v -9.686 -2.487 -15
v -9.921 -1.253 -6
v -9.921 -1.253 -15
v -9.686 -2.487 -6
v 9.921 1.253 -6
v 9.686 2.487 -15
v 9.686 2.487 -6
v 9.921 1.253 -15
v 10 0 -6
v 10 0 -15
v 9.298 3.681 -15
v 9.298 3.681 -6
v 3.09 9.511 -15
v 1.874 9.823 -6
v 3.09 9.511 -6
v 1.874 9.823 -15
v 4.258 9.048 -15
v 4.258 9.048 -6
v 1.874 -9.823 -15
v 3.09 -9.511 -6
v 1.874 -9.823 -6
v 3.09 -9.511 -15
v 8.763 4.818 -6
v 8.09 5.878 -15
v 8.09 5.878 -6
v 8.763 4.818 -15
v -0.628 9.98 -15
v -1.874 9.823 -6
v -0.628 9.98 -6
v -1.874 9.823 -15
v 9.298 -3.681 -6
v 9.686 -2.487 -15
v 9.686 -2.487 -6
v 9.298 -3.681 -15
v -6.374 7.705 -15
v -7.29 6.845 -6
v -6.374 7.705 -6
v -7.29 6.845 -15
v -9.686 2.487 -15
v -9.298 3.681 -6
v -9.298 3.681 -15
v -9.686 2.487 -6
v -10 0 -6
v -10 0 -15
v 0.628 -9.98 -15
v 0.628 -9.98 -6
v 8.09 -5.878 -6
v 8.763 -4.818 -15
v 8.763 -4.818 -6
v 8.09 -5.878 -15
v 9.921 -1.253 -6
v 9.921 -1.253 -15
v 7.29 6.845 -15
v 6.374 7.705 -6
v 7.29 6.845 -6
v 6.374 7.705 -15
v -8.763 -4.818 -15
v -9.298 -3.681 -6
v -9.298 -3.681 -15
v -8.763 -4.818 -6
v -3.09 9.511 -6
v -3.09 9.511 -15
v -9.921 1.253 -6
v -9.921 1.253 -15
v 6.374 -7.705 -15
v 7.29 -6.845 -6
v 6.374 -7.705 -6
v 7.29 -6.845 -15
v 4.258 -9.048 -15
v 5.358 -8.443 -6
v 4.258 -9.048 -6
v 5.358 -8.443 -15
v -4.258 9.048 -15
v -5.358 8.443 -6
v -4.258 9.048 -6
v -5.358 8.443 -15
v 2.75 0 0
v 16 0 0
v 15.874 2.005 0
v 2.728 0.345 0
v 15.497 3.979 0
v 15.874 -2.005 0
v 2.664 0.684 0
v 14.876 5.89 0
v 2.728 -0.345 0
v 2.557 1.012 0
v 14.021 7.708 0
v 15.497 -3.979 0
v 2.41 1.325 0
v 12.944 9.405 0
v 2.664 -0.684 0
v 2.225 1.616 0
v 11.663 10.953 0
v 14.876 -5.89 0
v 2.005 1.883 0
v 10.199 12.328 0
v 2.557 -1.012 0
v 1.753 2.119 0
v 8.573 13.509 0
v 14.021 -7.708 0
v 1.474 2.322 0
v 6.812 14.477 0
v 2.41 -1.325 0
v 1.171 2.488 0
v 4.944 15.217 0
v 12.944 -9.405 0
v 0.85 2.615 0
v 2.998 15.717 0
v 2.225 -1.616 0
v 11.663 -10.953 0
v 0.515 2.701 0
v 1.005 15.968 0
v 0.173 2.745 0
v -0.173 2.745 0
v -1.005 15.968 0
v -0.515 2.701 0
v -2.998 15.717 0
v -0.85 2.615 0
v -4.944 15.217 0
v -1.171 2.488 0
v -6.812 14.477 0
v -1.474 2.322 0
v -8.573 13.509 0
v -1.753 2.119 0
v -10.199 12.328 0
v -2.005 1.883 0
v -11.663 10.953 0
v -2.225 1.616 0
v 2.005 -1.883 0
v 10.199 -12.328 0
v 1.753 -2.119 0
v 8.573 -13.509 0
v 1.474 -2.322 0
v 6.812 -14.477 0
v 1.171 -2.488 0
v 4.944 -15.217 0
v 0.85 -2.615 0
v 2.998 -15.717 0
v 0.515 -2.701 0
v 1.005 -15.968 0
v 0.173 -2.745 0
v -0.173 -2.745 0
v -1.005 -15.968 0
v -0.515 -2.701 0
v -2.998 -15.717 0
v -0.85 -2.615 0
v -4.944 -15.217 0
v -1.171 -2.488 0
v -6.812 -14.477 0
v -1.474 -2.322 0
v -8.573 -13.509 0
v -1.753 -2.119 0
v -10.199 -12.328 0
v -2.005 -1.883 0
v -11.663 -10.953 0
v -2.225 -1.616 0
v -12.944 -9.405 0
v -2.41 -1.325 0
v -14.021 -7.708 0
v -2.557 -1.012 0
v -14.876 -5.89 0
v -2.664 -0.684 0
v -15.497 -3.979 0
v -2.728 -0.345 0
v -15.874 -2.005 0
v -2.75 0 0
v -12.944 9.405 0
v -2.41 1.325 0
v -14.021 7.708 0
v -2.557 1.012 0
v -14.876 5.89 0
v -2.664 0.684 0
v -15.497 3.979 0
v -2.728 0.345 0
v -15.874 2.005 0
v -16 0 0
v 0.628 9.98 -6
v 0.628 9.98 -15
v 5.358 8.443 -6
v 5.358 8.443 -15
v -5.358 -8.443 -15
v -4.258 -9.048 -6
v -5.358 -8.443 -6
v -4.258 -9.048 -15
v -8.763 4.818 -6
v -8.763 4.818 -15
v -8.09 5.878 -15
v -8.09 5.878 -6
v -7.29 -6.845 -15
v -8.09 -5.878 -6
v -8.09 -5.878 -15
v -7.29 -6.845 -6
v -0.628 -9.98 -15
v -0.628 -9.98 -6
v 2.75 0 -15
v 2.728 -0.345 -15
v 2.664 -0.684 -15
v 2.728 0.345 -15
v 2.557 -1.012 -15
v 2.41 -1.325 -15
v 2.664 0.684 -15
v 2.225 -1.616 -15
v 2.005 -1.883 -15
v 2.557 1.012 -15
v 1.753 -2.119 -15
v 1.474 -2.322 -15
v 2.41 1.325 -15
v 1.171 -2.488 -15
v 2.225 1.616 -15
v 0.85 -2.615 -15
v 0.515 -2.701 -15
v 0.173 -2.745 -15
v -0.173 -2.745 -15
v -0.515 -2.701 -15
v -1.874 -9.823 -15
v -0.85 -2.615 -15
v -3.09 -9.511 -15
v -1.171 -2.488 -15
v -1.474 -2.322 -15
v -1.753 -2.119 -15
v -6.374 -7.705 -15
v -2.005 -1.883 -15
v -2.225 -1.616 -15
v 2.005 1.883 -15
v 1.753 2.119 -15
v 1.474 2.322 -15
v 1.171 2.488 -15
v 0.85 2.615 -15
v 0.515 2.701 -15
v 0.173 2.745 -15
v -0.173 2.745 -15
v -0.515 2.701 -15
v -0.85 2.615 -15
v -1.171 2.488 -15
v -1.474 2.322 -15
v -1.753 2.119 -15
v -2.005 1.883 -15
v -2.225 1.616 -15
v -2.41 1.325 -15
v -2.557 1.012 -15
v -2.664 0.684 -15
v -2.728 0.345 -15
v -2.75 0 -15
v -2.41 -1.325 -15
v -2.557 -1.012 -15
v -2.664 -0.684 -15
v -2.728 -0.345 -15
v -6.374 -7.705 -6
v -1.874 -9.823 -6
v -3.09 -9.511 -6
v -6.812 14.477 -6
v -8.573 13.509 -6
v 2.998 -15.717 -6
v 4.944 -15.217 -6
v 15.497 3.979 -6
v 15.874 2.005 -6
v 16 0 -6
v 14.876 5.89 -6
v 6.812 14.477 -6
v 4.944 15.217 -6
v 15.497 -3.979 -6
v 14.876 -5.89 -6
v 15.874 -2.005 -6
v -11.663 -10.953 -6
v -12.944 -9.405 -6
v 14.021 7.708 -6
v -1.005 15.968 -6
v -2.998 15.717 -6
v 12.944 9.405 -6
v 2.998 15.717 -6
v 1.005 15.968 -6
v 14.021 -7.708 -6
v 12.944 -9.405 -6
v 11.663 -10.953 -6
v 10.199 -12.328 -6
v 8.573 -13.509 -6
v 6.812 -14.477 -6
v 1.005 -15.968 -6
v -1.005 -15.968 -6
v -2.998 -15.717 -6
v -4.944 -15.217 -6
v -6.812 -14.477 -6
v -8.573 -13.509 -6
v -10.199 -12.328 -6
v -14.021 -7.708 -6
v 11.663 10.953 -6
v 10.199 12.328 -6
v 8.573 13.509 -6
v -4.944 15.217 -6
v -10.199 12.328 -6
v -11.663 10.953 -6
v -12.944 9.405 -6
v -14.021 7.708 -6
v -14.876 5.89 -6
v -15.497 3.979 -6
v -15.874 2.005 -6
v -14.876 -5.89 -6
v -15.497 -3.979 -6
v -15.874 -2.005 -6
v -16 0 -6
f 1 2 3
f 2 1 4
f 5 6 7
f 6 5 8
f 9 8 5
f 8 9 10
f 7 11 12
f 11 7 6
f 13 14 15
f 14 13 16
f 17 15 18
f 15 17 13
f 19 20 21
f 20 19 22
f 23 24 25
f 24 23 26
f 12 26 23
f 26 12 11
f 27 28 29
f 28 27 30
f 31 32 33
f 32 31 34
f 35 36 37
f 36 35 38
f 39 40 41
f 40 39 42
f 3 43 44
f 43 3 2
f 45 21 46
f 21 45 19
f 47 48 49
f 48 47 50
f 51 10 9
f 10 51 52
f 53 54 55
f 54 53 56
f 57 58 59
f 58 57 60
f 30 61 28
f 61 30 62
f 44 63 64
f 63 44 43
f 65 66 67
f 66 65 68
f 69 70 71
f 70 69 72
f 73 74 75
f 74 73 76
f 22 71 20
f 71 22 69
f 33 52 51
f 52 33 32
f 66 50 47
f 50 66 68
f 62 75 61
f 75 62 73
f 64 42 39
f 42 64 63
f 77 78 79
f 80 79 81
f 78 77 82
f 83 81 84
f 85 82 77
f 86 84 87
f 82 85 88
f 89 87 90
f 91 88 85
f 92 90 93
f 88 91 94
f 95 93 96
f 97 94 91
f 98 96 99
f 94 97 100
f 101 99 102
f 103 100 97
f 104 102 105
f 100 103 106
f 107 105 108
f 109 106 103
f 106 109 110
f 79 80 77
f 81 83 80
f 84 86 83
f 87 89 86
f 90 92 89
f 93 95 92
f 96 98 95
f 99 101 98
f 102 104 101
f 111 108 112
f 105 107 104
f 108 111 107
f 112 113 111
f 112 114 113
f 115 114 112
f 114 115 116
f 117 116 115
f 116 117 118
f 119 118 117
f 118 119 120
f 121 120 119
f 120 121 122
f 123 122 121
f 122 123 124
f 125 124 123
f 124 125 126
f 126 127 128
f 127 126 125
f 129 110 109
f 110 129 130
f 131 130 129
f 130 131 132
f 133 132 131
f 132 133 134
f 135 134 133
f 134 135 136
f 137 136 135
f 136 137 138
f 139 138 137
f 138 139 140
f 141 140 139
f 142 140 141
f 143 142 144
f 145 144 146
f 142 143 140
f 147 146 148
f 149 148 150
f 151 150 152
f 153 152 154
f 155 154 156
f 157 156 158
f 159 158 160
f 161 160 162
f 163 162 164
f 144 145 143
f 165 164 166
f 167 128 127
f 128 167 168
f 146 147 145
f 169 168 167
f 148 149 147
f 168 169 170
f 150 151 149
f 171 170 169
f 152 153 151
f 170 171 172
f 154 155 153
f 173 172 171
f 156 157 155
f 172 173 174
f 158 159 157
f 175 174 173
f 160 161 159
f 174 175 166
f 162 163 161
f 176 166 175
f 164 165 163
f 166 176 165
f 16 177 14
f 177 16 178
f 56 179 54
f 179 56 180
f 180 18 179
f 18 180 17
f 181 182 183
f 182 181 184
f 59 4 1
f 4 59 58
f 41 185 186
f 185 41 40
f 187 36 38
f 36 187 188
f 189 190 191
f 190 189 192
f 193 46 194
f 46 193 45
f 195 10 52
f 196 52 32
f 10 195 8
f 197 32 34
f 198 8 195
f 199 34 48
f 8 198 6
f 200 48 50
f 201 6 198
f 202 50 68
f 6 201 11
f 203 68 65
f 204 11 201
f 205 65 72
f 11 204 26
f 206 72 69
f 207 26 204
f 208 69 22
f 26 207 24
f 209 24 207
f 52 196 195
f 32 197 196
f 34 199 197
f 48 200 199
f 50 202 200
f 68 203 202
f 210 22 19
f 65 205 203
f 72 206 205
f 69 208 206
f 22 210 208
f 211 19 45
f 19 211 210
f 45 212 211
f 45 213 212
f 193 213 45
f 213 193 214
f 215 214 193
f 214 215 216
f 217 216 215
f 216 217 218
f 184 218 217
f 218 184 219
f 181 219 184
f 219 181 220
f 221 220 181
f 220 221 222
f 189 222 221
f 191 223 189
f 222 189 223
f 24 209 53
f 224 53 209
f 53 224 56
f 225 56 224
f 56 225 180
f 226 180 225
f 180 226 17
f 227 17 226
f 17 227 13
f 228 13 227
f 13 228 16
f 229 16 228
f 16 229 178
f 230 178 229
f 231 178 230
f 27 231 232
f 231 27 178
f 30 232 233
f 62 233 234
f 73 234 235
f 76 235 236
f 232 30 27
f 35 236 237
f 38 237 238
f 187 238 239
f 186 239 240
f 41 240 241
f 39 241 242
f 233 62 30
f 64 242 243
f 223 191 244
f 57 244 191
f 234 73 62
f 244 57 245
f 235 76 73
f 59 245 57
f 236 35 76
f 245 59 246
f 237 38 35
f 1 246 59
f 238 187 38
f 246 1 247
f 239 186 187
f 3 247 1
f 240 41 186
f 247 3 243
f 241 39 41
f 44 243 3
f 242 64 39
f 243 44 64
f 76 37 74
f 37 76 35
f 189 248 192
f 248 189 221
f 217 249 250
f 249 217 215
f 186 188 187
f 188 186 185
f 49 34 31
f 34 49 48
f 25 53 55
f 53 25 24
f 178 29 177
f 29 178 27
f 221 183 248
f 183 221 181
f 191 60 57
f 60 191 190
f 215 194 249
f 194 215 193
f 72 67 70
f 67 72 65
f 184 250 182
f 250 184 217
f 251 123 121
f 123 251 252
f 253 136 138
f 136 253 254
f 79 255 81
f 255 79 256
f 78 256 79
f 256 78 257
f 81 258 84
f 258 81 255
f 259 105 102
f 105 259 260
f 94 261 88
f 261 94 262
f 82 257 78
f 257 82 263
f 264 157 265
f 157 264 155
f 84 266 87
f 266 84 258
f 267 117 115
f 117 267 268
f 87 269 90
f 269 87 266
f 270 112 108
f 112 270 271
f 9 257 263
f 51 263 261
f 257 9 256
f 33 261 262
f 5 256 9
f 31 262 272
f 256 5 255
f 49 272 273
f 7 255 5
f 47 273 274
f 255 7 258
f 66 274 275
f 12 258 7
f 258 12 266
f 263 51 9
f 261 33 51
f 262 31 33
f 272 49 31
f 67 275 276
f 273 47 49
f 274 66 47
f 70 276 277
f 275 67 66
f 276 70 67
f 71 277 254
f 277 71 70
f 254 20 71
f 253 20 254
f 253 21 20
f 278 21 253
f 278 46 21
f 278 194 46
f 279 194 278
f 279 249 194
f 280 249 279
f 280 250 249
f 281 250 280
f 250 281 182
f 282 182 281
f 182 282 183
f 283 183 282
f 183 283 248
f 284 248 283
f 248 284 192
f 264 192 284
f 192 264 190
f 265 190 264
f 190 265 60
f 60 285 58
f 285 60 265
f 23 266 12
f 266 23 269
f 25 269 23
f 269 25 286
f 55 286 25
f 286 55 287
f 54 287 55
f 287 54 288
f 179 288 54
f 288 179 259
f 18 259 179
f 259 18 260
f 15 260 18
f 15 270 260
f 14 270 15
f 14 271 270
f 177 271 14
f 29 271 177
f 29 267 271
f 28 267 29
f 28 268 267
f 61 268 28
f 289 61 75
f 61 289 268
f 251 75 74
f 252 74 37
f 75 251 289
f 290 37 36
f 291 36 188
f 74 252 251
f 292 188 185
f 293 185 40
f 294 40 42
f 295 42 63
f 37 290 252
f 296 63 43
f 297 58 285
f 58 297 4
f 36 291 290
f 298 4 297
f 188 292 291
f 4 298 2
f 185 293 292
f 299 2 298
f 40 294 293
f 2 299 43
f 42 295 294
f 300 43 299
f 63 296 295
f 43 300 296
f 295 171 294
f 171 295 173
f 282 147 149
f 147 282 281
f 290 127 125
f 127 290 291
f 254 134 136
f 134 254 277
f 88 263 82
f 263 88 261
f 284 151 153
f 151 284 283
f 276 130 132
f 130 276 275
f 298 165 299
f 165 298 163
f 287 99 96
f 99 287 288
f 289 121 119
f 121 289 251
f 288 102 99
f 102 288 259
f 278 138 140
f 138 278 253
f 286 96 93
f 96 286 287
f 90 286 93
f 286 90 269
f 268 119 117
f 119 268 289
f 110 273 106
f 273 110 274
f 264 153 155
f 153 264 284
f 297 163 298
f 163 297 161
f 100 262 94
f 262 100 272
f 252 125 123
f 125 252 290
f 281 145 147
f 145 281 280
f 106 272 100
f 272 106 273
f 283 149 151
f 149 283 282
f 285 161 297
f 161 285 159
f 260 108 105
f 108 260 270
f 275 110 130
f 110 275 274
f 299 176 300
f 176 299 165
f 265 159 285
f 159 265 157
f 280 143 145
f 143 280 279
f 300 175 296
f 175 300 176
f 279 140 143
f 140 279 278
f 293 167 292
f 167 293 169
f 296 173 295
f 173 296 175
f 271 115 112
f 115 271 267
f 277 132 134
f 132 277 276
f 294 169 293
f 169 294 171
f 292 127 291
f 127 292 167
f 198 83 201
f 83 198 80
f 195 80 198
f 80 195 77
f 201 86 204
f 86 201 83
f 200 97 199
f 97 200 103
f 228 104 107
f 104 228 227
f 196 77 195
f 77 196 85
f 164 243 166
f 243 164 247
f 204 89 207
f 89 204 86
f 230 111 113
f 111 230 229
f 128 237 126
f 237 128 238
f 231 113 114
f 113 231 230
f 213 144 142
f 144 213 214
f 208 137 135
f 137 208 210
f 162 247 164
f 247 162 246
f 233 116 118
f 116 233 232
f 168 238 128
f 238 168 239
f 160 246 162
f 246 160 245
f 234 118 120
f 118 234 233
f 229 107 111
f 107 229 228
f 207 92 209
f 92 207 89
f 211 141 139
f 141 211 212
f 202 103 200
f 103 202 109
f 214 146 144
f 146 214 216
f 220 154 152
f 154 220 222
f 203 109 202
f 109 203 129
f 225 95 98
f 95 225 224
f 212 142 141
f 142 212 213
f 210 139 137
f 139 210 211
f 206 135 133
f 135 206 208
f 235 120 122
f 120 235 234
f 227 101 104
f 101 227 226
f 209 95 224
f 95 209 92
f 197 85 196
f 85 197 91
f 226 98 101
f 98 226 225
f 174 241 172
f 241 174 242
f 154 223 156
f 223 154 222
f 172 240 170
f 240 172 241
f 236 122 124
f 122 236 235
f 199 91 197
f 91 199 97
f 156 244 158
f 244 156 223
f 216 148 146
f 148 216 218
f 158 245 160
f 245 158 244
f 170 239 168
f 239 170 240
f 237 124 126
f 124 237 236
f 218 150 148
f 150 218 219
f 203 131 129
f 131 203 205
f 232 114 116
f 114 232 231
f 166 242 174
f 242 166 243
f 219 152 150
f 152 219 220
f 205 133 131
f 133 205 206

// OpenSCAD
$fn = 50;


difference() {
	union() {
		translate(v = [0, 0, -15.0000000000]) {
			cylinder(h = 15, r = 10.0000000000);
		}
		translate(v = [0, 0, -6.0000000000]) {
			cylinder(h = 6, r = 16.0000000000);
		}
	}
	union() {
		#translate(v = [0, 0, -15]) {
			cylinder(h = 15, r = 2.7500000000);
		}
	}
}
